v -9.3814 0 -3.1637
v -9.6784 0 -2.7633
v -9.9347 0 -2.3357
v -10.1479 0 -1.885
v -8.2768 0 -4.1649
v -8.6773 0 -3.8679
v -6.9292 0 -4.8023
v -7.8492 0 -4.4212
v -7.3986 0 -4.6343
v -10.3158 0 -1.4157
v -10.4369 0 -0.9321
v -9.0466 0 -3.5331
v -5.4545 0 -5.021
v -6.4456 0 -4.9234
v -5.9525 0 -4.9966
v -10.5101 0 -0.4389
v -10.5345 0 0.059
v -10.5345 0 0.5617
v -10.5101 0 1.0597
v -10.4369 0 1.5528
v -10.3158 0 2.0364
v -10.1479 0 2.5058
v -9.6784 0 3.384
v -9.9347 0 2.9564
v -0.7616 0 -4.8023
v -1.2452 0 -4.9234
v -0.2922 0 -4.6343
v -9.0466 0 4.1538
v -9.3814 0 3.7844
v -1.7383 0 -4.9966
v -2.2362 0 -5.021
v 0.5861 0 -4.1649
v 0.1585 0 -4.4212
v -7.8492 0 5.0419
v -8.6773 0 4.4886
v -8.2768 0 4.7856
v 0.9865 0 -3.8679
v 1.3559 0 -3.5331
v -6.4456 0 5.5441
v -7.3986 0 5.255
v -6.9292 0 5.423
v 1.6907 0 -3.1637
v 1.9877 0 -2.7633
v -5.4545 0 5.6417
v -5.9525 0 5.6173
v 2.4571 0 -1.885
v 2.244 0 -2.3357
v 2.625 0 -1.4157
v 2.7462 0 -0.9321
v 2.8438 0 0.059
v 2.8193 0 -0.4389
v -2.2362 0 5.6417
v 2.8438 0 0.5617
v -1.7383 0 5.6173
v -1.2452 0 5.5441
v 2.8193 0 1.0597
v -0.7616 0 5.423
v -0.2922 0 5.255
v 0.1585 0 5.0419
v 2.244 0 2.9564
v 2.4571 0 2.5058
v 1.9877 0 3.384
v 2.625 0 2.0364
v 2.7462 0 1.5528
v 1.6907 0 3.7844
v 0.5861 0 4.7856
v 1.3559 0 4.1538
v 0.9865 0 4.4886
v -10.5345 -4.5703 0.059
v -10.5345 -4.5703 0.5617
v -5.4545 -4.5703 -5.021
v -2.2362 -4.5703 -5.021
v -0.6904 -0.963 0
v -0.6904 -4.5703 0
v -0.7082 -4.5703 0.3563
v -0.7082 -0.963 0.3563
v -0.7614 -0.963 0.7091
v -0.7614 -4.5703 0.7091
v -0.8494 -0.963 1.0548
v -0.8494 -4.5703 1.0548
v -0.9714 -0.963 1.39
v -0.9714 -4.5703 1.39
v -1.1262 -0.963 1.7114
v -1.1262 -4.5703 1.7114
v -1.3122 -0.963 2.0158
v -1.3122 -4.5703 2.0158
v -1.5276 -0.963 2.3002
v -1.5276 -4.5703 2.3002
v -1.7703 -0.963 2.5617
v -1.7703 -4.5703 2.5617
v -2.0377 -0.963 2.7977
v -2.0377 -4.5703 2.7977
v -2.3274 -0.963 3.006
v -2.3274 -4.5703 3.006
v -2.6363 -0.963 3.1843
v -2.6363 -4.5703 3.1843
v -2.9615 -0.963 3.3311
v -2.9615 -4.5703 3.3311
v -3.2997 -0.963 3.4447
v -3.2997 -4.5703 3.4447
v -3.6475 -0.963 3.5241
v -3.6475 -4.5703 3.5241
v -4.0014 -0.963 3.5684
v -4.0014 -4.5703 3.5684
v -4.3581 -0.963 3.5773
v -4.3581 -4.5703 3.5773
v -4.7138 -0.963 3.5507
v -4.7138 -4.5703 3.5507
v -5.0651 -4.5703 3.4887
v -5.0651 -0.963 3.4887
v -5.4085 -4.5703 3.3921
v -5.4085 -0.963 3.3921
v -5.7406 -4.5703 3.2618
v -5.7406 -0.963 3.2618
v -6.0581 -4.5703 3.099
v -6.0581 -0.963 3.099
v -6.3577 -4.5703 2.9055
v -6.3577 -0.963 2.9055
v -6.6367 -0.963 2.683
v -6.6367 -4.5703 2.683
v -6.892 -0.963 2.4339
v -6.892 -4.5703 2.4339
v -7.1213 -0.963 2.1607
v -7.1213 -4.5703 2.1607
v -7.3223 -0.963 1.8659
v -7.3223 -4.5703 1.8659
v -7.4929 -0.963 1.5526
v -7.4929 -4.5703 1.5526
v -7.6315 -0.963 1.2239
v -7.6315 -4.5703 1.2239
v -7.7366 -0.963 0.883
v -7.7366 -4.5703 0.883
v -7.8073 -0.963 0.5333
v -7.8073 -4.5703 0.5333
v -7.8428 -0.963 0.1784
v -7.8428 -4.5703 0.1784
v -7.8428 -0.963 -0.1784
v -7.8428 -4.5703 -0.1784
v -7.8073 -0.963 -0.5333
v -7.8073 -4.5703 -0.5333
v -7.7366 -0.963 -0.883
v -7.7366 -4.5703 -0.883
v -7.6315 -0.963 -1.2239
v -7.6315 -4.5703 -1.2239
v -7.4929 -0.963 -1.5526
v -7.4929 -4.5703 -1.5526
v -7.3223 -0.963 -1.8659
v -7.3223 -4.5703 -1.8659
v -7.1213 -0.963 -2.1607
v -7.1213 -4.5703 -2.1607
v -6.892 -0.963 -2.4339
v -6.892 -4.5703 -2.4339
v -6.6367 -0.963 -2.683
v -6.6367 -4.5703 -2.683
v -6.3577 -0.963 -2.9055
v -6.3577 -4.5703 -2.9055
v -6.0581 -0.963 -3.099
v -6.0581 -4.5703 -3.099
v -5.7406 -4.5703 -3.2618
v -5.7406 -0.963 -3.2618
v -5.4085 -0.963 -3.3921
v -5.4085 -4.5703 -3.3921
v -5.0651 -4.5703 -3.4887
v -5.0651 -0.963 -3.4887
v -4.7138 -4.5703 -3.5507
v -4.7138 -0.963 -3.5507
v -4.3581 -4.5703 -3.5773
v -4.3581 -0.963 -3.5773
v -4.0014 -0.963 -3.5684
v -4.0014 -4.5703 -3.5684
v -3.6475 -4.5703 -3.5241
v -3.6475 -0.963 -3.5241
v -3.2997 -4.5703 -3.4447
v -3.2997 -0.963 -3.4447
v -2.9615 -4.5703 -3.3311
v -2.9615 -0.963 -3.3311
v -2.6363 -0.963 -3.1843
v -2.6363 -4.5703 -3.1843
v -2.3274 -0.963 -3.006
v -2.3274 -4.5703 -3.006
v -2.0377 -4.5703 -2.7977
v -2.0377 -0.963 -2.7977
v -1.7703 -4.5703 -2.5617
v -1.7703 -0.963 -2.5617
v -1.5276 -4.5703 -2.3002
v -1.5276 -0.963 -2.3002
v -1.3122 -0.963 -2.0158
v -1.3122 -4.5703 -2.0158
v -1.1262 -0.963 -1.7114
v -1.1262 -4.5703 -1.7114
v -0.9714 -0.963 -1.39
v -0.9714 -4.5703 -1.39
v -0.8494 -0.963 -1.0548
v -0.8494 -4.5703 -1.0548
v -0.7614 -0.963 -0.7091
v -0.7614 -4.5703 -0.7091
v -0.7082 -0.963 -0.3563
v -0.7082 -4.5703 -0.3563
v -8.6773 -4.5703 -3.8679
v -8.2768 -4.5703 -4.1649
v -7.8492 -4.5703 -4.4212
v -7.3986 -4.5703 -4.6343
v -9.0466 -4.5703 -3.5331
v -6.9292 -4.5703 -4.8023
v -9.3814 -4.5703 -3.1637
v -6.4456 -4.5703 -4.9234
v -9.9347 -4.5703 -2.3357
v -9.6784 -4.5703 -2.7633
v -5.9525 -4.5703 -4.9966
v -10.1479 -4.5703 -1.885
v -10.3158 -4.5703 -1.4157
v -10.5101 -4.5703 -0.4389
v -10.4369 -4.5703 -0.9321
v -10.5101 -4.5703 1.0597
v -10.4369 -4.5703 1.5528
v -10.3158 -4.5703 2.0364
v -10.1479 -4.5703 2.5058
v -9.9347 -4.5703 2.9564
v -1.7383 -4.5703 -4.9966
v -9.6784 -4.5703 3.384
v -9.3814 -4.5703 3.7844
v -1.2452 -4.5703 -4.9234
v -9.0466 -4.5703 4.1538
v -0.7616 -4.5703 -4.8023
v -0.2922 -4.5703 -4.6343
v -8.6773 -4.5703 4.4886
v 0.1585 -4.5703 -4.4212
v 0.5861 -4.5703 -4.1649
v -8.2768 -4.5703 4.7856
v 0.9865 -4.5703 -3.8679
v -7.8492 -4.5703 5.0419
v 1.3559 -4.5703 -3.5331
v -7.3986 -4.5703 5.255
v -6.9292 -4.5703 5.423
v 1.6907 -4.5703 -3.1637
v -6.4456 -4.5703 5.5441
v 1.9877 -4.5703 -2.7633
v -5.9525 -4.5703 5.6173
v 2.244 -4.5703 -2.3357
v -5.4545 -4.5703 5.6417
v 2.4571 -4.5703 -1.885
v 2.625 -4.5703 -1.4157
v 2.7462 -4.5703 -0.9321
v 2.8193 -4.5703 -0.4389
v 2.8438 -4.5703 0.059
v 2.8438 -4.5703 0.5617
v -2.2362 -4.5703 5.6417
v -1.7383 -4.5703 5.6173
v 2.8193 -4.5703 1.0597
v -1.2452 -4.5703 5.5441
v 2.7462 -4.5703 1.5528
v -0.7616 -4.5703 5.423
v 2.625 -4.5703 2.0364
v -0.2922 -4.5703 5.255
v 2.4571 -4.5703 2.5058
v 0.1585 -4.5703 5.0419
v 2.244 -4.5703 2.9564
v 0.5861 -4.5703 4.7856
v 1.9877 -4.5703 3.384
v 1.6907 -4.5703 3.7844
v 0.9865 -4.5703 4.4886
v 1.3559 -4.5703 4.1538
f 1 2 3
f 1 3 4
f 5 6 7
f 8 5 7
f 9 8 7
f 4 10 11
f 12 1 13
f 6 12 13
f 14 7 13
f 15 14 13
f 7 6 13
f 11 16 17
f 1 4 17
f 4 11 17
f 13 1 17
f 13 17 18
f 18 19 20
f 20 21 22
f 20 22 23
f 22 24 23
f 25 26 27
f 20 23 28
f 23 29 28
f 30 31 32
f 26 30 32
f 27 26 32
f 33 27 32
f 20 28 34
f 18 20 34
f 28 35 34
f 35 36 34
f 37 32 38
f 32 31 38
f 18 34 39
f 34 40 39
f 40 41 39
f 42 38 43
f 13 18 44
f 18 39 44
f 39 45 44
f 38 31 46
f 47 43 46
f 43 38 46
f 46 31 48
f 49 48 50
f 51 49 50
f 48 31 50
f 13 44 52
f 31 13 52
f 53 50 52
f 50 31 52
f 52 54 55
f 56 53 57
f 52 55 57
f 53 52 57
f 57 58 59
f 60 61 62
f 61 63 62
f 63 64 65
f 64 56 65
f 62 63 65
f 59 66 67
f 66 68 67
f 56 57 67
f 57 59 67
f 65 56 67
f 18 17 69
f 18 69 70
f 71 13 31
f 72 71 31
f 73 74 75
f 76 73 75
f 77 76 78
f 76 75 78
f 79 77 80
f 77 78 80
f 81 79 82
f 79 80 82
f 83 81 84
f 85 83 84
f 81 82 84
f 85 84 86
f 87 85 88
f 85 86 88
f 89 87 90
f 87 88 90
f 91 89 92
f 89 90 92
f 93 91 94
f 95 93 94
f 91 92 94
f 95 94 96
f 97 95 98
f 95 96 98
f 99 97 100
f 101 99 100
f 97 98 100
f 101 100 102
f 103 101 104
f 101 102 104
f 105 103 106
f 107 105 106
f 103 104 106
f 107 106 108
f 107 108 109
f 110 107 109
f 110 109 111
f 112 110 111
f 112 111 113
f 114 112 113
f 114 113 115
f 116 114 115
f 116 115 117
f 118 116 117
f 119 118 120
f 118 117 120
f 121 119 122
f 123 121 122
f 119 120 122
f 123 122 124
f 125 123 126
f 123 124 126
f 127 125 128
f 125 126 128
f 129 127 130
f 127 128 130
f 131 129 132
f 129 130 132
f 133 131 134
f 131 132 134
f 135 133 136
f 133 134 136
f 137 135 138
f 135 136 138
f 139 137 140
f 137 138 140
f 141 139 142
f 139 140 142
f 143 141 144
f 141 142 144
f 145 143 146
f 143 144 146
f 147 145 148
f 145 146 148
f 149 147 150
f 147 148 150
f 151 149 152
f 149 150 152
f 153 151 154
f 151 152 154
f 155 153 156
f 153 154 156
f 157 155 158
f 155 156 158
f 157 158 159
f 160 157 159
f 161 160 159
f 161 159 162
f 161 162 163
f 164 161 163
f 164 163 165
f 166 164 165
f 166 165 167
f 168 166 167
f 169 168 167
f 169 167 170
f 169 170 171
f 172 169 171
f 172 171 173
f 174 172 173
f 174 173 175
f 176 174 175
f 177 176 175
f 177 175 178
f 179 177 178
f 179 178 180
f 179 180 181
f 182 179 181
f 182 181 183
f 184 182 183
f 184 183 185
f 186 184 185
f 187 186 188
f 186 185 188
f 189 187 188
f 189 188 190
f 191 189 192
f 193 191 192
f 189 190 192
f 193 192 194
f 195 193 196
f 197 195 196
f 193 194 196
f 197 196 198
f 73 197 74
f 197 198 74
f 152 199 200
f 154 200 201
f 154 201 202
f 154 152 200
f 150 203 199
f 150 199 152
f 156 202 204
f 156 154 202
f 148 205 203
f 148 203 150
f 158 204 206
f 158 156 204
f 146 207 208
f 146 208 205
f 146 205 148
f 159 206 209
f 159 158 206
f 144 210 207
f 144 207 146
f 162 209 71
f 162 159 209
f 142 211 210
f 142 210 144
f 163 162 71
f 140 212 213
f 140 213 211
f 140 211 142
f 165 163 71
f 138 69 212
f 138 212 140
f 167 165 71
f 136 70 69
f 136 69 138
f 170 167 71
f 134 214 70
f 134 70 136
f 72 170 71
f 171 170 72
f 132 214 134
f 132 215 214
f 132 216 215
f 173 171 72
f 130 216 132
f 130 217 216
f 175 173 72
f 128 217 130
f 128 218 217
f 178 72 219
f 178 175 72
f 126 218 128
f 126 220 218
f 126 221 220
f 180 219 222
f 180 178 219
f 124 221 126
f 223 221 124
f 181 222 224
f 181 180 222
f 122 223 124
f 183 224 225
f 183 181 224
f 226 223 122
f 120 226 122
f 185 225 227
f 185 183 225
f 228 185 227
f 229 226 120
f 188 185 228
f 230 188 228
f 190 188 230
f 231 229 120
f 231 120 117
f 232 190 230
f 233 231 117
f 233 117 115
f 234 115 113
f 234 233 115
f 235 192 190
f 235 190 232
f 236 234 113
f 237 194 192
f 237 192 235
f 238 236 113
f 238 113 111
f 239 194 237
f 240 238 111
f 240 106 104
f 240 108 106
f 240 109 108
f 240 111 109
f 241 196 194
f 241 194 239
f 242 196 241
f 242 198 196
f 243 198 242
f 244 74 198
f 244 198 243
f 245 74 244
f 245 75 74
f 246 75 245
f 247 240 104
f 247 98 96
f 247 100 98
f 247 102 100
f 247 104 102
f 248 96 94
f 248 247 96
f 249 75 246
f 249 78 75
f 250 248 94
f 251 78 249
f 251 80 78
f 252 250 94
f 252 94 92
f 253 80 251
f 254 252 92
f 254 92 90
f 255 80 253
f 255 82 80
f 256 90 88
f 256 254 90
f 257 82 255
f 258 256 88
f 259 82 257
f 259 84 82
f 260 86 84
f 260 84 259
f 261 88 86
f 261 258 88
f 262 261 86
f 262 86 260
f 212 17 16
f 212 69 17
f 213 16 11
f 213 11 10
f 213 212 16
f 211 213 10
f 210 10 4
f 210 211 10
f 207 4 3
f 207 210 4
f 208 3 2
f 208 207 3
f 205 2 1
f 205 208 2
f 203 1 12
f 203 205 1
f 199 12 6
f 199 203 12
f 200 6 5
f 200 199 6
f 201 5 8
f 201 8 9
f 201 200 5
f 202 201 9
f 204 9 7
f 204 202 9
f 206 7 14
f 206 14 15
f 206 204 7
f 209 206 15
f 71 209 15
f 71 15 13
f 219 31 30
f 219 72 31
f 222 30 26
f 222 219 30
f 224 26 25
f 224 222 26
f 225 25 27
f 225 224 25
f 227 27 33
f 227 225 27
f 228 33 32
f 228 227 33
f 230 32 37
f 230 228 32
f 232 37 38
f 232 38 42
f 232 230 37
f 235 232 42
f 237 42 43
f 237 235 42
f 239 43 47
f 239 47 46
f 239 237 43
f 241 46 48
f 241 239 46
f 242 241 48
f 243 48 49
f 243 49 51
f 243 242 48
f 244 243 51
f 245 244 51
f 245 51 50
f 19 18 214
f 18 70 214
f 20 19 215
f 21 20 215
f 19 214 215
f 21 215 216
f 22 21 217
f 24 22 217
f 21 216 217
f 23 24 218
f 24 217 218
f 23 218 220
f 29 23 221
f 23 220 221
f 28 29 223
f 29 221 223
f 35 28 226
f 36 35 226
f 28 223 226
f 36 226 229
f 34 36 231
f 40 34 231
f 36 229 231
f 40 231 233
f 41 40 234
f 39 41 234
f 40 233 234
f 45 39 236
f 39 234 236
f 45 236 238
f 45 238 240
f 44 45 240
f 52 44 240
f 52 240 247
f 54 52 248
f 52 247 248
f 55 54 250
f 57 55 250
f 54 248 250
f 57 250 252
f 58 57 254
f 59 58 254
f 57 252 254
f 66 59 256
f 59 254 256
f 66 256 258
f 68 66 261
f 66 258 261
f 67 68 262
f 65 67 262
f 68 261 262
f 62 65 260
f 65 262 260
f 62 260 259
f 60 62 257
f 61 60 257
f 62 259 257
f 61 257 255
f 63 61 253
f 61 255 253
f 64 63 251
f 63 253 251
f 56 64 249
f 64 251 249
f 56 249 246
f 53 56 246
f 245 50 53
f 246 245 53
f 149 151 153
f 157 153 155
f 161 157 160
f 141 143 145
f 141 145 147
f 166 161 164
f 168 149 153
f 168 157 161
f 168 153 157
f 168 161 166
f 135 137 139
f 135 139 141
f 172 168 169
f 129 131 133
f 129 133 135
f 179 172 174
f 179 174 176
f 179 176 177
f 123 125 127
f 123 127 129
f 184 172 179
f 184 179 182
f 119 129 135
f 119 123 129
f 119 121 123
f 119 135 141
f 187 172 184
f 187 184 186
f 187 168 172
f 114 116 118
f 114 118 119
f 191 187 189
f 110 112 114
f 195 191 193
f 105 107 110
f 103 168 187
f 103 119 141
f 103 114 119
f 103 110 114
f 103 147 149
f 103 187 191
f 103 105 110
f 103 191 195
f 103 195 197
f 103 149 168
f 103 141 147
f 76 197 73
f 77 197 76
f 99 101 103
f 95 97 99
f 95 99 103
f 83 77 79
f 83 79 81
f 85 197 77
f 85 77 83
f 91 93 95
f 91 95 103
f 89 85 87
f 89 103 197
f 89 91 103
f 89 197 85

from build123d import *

# Parameters (mm, degrees)
F0_W     = 13.378338
F0_H     = 10.662744
F1_DEPTH = 4.57033
F2_R     = 3.578427
F3_DEPTH = 3.60733
F4_R     = 5.08


with BuildPart() as f1:
    # F0 (on Front) → F1 (new body)
    with BuildSketch(Plane.XZ):
        with Locations((-3.845378, 0.310359)):
            Rectangle(F0_W, F0_H)
    extrude(amount=F1_DEPTH)

    # F2 (on face) → F3 (cut)
    with BuildSketch(Plane.XZ.offset(4.57033)):
        with Locations((-4.26886, 0)):
            Circle(F2_R)
    extrude(amount=-F3_DEPTH, mode=Mode.SUBTRACT)

    # F4
    f4_edges = [f1.edges().sort_by_distance(p)[0] for p in [
        (2.843791, -2.285165, -5.021013),
        (2.843791, -2.285165, 5.641731),
        (-10.534547, -2.285165, 5.641731),
        (-10.534547, -2.285165, -5.021013),
    ]]
    fillet(f4_edges, radius=F4_R)


solid = f1.part
